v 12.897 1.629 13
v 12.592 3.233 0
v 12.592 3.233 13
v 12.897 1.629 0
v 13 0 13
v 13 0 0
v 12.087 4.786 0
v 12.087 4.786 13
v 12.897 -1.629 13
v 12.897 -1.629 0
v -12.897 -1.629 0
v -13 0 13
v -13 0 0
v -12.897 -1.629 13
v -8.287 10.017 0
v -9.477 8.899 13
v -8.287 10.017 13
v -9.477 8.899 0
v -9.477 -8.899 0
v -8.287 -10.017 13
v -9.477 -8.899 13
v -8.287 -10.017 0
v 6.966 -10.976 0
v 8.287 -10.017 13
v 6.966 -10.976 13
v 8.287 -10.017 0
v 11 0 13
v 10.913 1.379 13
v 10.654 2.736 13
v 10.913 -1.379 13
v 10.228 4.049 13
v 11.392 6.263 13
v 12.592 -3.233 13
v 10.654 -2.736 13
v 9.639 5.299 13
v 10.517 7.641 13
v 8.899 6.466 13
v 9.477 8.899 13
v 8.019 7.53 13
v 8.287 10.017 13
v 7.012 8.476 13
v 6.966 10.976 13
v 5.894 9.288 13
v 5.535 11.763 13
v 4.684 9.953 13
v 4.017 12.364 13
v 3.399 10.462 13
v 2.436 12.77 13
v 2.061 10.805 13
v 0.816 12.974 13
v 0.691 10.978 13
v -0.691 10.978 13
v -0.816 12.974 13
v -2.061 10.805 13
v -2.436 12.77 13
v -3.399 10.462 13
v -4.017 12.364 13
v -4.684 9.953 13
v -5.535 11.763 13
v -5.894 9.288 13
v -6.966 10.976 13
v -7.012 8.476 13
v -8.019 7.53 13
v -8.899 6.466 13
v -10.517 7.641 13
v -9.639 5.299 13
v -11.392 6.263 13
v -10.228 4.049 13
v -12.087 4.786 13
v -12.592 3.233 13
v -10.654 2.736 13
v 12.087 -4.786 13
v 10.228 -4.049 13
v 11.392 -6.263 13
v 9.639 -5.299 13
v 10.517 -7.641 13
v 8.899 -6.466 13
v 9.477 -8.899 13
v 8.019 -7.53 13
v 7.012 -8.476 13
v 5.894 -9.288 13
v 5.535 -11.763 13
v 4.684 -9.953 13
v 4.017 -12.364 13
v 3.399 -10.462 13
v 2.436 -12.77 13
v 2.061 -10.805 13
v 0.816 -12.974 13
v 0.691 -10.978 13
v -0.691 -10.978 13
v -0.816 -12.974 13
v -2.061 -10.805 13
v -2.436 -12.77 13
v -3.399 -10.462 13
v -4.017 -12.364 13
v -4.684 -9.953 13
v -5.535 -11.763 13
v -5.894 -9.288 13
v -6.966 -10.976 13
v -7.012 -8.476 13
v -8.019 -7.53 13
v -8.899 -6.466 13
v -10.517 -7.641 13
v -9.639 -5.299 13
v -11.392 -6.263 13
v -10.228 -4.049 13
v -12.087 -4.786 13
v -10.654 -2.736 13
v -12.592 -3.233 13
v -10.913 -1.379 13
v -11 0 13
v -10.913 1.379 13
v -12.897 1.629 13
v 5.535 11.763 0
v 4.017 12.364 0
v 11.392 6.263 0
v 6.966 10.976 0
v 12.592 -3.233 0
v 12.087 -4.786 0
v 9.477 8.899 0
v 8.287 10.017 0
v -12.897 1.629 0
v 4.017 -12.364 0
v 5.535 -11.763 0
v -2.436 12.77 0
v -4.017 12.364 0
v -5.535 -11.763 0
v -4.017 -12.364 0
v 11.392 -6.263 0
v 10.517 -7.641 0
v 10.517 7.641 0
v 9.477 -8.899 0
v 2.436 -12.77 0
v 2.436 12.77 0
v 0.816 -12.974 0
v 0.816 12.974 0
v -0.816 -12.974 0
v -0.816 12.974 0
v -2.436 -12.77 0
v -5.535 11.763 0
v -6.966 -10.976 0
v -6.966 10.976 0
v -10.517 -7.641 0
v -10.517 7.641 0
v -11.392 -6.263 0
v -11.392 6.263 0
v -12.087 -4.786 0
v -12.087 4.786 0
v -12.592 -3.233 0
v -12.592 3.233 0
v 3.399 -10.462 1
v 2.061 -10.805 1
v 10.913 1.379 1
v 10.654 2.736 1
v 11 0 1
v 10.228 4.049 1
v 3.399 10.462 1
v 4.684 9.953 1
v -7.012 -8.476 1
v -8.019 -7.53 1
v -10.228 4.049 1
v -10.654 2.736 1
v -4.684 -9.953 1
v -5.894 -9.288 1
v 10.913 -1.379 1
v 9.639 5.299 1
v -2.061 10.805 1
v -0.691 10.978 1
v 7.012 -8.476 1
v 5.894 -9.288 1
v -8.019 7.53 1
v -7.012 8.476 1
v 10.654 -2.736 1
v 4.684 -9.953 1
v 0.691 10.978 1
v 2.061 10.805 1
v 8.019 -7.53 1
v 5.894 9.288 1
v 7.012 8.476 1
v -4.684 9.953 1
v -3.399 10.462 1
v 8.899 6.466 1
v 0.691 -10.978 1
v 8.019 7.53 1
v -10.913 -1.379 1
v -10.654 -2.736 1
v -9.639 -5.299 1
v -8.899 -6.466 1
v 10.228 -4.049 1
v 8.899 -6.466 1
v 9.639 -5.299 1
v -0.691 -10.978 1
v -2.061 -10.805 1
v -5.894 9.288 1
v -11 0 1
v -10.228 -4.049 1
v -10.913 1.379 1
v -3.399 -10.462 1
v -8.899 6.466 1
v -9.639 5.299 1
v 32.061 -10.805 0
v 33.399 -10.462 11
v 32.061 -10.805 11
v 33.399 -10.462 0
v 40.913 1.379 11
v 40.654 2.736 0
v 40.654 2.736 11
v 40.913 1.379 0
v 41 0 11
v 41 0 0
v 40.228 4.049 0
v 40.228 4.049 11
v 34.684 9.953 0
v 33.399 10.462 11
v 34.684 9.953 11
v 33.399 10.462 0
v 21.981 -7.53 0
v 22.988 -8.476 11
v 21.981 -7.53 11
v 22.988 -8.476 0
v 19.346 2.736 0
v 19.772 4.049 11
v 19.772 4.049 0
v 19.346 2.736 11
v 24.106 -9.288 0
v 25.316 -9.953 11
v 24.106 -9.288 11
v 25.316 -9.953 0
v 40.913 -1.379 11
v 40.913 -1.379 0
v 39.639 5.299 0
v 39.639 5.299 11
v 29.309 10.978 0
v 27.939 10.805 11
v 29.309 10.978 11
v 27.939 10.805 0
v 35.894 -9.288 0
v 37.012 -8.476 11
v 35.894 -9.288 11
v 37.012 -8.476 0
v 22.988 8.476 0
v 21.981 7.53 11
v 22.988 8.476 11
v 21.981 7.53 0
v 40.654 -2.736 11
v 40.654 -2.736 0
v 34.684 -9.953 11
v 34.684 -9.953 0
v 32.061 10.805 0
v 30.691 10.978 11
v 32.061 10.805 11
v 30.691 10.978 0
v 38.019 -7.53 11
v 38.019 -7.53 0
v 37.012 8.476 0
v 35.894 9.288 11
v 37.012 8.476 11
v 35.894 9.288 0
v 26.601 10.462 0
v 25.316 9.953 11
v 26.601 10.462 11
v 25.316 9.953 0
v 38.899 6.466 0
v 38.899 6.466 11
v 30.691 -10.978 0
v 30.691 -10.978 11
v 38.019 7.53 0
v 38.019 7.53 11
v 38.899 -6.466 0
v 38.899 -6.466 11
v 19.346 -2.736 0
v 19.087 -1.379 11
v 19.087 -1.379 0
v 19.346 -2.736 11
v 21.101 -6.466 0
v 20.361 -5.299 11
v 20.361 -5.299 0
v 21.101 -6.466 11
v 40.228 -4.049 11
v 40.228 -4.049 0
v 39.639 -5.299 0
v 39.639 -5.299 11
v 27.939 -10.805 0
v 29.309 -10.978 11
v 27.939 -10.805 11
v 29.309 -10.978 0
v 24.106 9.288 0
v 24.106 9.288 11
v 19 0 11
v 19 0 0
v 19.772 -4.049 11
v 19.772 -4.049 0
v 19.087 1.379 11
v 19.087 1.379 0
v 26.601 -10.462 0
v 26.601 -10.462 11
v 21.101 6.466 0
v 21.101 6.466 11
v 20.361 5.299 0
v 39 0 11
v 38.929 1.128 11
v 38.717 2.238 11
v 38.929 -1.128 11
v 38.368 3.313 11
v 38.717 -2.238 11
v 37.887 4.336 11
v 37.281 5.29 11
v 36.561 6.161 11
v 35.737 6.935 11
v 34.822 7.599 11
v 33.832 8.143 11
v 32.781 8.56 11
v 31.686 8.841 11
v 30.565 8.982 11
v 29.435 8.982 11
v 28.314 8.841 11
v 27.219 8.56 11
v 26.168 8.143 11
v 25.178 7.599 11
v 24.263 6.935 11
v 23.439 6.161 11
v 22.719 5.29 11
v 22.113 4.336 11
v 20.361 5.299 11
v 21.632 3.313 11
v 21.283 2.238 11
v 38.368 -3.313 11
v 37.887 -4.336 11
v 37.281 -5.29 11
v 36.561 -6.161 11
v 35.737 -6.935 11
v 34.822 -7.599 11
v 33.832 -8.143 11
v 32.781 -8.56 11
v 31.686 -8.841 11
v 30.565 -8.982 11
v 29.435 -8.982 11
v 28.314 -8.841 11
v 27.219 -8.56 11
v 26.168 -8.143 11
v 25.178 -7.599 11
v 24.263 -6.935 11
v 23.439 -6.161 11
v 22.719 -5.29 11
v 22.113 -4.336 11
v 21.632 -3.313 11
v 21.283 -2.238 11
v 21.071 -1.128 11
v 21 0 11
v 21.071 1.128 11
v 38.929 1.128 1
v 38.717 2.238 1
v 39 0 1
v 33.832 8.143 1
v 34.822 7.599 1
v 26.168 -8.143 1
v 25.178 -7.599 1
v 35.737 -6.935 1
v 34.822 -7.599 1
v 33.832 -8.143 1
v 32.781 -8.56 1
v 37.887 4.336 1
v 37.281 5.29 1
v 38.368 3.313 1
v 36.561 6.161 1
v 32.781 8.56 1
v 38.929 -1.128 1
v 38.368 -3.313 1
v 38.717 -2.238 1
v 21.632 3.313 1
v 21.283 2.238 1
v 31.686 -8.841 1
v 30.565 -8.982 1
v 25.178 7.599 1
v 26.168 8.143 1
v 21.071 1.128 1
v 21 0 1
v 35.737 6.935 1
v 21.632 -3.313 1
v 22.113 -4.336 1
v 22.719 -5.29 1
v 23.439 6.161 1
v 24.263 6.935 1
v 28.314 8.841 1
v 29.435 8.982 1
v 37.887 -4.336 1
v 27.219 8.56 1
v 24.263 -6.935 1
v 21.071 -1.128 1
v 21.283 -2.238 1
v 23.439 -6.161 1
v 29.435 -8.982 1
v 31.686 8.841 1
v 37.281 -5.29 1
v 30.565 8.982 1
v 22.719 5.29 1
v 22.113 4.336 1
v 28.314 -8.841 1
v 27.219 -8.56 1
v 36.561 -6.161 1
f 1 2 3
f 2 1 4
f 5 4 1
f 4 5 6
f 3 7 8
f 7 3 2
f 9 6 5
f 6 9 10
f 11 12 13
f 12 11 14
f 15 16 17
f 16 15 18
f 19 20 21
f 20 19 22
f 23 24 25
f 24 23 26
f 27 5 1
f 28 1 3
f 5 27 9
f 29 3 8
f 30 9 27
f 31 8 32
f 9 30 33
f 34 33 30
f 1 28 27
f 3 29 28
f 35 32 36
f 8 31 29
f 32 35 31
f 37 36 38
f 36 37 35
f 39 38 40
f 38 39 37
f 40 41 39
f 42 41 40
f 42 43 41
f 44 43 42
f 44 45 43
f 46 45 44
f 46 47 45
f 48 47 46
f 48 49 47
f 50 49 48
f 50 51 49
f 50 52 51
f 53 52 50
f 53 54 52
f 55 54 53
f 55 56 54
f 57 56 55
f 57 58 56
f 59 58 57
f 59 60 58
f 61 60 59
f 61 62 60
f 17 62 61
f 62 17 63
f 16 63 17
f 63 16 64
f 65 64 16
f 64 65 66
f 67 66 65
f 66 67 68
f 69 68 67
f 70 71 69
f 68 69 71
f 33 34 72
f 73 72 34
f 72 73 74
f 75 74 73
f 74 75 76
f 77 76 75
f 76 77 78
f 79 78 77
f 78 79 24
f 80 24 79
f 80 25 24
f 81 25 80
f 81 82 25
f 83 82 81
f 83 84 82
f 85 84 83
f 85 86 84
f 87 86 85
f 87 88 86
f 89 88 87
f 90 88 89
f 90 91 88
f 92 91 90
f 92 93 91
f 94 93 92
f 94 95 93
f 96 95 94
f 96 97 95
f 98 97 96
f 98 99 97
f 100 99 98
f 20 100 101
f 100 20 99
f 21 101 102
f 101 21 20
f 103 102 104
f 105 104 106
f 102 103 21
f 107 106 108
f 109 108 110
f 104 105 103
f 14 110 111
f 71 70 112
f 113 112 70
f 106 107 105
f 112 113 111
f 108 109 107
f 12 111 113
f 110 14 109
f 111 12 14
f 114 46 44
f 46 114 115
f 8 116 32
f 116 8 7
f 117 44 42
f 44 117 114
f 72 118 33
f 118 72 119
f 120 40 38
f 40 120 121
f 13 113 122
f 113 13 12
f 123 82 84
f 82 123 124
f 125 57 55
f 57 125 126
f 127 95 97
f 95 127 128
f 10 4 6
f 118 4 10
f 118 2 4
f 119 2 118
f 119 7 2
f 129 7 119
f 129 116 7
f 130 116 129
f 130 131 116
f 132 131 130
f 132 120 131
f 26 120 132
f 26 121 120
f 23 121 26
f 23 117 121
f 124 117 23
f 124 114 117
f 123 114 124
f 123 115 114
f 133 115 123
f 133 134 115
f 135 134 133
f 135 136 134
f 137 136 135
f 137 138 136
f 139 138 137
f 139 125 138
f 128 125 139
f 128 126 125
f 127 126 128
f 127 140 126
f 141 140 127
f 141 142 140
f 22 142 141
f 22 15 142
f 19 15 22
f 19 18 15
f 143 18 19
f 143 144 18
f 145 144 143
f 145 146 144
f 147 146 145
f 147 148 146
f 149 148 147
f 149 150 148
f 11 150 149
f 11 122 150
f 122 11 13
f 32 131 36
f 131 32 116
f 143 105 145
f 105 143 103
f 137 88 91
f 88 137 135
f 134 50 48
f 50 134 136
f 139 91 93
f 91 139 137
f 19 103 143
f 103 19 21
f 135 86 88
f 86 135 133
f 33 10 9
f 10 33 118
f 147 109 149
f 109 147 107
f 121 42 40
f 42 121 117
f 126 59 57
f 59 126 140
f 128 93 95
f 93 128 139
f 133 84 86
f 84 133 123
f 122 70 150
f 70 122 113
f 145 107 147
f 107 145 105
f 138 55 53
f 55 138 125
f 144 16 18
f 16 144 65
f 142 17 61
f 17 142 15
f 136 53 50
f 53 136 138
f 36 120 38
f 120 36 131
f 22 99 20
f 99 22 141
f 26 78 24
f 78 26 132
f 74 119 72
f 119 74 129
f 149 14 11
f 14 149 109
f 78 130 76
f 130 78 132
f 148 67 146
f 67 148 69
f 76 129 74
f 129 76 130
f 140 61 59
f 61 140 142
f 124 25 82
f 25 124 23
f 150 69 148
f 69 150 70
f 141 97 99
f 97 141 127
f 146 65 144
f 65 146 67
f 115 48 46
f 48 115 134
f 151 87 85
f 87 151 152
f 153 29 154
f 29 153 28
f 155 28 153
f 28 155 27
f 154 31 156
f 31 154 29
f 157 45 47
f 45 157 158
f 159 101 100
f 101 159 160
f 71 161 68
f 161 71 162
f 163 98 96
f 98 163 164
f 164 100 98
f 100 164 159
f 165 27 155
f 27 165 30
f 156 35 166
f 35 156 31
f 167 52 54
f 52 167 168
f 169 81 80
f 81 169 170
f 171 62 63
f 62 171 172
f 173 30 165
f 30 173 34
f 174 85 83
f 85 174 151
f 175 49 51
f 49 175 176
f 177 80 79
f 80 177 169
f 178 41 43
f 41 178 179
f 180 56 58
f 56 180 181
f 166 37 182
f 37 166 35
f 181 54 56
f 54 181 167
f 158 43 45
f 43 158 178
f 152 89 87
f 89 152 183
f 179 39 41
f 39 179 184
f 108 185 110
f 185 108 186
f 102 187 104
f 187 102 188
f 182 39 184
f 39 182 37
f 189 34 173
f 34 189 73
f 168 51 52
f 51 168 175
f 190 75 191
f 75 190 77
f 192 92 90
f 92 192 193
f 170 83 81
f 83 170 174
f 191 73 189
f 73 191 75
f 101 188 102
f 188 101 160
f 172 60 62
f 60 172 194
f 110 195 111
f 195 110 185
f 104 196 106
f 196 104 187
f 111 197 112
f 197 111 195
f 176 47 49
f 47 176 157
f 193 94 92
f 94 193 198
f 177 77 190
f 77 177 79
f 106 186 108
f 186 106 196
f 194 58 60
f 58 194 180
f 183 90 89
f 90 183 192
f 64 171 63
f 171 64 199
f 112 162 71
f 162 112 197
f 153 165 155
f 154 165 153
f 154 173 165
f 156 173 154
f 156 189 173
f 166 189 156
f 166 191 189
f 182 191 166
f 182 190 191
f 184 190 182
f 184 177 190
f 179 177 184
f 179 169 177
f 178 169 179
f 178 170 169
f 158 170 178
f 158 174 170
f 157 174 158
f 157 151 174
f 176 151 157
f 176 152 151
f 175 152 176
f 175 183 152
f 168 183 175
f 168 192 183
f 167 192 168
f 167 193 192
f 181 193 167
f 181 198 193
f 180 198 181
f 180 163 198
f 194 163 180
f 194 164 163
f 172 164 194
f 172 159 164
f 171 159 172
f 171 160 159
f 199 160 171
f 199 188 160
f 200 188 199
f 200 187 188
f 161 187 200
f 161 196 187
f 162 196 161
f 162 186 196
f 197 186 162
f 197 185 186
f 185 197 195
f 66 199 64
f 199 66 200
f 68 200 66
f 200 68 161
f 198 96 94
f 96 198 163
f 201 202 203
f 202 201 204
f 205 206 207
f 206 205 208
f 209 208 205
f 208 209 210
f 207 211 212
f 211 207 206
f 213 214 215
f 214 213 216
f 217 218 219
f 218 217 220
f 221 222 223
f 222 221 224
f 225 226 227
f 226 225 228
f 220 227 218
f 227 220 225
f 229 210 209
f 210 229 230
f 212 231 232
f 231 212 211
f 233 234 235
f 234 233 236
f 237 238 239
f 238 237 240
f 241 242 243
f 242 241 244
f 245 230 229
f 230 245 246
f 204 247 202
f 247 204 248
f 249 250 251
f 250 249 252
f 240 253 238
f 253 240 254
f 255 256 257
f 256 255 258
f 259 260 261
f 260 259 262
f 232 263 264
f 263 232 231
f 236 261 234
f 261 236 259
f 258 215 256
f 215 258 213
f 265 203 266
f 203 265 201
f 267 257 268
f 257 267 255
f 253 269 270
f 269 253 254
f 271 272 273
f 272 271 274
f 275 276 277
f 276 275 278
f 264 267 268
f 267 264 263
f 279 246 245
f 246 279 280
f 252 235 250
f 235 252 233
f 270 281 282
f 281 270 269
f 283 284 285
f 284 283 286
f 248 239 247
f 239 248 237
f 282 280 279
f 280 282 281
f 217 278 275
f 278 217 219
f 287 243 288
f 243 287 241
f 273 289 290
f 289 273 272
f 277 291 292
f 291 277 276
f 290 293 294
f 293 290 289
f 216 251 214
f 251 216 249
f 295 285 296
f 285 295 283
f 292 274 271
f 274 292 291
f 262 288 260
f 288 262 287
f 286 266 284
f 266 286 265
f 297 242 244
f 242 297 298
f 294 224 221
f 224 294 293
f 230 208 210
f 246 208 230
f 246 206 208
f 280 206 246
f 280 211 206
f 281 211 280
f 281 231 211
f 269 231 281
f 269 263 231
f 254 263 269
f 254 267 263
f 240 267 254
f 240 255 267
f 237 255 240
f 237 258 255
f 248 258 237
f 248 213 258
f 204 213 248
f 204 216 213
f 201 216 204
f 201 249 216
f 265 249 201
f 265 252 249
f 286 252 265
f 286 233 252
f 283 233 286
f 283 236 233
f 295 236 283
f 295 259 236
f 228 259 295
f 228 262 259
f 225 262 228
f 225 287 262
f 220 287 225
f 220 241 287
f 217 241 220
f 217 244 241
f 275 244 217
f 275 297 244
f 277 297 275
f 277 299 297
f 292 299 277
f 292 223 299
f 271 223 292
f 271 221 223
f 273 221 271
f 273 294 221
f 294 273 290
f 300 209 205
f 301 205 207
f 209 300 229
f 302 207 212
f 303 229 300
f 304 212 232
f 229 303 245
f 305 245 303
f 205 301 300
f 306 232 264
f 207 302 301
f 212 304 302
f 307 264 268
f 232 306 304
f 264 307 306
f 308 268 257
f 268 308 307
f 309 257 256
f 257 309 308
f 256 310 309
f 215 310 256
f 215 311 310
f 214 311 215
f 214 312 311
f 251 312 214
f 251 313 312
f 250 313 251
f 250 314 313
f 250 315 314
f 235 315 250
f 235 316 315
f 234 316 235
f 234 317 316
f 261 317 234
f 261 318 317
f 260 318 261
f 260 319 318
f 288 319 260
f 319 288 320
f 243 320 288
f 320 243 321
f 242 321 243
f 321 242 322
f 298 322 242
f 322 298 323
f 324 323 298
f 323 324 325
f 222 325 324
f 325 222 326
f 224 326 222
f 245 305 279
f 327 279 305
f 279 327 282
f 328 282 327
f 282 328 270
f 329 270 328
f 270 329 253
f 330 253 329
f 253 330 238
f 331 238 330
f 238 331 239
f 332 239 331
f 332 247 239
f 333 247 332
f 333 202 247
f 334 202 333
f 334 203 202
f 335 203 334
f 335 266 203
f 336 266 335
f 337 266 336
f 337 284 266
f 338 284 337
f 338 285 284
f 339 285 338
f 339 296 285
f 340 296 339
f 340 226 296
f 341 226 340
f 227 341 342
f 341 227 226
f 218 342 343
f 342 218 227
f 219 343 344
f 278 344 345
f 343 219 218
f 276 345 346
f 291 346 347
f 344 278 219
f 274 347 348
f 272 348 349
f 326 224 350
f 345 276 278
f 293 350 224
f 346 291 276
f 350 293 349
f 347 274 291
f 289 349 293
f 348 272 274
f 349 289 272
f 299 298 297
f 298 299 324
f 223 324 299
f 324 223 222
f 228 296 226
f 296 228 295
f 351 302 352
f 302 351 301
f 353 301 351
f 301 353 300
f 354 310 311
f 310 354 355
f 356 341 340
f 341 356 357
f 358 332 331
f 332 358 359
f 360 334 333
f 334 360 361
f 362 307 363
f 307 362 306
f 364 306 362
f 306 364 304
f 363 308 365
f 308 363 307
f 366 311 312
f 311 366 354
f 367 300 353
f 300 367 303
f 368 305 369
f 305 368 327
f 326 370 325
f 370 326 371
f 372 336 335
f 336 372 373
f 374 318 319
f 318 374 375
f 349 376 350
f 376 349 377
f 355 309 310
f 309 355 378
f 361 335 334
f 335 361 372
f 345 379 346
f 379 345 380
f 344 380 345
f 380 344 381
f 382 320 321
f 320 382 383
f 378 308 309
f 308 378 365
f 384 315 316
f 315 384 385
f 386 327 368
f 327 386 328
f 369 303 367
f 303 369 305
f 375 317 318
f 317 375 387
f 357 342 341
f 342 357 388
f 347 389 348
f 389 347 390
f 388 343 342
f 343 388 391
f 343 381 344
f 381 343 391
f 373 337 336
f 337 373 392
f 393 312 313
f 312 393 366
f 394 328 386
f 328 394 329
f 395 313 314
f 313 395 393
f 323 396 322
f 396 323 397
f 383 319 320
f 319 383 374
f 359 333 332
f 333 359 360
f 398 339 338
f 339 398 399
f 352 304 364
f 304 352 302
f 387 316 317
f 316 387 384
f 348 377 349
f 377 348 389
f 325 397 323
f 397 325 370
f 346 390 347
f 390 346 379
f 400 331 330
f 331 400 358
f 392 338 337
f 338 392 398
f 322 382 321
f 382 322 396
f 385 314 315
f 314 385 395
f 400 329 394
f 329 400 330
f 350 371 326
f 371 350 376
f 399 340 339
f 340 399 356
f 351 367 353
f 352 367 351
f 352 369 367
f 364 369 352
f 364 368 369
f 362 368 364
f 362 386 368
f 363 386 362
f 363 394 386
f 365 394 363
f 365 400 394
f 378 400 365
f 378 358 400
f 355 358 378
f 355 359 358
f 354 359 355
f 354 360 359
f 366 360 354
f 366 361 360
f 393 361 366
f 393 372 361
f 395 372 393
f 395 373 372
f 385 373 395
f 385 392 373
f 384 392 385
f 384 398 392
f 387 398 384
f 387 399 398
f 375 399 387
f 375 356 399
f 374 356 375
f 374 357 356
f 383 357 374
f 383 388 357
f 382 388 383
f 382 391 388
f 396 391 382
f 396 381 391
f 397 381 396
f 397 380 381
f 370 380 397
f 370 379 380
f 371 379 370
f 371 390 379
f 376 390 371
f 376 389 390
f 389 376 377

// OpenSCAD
module cup(h, r, wall) {
	difference(){
		cylinder(h = h, r1 = r, r2 = r, center = false, $fn=50);
		translate([0, 0, wall / 2])
		cylinder(h = h, r1 = r - wall, r2 = r - wall, center = false, $fn=50);
	}
}

cup(13, 13, 2);

translate([30,0,0])
cup(11, 11, 2);
